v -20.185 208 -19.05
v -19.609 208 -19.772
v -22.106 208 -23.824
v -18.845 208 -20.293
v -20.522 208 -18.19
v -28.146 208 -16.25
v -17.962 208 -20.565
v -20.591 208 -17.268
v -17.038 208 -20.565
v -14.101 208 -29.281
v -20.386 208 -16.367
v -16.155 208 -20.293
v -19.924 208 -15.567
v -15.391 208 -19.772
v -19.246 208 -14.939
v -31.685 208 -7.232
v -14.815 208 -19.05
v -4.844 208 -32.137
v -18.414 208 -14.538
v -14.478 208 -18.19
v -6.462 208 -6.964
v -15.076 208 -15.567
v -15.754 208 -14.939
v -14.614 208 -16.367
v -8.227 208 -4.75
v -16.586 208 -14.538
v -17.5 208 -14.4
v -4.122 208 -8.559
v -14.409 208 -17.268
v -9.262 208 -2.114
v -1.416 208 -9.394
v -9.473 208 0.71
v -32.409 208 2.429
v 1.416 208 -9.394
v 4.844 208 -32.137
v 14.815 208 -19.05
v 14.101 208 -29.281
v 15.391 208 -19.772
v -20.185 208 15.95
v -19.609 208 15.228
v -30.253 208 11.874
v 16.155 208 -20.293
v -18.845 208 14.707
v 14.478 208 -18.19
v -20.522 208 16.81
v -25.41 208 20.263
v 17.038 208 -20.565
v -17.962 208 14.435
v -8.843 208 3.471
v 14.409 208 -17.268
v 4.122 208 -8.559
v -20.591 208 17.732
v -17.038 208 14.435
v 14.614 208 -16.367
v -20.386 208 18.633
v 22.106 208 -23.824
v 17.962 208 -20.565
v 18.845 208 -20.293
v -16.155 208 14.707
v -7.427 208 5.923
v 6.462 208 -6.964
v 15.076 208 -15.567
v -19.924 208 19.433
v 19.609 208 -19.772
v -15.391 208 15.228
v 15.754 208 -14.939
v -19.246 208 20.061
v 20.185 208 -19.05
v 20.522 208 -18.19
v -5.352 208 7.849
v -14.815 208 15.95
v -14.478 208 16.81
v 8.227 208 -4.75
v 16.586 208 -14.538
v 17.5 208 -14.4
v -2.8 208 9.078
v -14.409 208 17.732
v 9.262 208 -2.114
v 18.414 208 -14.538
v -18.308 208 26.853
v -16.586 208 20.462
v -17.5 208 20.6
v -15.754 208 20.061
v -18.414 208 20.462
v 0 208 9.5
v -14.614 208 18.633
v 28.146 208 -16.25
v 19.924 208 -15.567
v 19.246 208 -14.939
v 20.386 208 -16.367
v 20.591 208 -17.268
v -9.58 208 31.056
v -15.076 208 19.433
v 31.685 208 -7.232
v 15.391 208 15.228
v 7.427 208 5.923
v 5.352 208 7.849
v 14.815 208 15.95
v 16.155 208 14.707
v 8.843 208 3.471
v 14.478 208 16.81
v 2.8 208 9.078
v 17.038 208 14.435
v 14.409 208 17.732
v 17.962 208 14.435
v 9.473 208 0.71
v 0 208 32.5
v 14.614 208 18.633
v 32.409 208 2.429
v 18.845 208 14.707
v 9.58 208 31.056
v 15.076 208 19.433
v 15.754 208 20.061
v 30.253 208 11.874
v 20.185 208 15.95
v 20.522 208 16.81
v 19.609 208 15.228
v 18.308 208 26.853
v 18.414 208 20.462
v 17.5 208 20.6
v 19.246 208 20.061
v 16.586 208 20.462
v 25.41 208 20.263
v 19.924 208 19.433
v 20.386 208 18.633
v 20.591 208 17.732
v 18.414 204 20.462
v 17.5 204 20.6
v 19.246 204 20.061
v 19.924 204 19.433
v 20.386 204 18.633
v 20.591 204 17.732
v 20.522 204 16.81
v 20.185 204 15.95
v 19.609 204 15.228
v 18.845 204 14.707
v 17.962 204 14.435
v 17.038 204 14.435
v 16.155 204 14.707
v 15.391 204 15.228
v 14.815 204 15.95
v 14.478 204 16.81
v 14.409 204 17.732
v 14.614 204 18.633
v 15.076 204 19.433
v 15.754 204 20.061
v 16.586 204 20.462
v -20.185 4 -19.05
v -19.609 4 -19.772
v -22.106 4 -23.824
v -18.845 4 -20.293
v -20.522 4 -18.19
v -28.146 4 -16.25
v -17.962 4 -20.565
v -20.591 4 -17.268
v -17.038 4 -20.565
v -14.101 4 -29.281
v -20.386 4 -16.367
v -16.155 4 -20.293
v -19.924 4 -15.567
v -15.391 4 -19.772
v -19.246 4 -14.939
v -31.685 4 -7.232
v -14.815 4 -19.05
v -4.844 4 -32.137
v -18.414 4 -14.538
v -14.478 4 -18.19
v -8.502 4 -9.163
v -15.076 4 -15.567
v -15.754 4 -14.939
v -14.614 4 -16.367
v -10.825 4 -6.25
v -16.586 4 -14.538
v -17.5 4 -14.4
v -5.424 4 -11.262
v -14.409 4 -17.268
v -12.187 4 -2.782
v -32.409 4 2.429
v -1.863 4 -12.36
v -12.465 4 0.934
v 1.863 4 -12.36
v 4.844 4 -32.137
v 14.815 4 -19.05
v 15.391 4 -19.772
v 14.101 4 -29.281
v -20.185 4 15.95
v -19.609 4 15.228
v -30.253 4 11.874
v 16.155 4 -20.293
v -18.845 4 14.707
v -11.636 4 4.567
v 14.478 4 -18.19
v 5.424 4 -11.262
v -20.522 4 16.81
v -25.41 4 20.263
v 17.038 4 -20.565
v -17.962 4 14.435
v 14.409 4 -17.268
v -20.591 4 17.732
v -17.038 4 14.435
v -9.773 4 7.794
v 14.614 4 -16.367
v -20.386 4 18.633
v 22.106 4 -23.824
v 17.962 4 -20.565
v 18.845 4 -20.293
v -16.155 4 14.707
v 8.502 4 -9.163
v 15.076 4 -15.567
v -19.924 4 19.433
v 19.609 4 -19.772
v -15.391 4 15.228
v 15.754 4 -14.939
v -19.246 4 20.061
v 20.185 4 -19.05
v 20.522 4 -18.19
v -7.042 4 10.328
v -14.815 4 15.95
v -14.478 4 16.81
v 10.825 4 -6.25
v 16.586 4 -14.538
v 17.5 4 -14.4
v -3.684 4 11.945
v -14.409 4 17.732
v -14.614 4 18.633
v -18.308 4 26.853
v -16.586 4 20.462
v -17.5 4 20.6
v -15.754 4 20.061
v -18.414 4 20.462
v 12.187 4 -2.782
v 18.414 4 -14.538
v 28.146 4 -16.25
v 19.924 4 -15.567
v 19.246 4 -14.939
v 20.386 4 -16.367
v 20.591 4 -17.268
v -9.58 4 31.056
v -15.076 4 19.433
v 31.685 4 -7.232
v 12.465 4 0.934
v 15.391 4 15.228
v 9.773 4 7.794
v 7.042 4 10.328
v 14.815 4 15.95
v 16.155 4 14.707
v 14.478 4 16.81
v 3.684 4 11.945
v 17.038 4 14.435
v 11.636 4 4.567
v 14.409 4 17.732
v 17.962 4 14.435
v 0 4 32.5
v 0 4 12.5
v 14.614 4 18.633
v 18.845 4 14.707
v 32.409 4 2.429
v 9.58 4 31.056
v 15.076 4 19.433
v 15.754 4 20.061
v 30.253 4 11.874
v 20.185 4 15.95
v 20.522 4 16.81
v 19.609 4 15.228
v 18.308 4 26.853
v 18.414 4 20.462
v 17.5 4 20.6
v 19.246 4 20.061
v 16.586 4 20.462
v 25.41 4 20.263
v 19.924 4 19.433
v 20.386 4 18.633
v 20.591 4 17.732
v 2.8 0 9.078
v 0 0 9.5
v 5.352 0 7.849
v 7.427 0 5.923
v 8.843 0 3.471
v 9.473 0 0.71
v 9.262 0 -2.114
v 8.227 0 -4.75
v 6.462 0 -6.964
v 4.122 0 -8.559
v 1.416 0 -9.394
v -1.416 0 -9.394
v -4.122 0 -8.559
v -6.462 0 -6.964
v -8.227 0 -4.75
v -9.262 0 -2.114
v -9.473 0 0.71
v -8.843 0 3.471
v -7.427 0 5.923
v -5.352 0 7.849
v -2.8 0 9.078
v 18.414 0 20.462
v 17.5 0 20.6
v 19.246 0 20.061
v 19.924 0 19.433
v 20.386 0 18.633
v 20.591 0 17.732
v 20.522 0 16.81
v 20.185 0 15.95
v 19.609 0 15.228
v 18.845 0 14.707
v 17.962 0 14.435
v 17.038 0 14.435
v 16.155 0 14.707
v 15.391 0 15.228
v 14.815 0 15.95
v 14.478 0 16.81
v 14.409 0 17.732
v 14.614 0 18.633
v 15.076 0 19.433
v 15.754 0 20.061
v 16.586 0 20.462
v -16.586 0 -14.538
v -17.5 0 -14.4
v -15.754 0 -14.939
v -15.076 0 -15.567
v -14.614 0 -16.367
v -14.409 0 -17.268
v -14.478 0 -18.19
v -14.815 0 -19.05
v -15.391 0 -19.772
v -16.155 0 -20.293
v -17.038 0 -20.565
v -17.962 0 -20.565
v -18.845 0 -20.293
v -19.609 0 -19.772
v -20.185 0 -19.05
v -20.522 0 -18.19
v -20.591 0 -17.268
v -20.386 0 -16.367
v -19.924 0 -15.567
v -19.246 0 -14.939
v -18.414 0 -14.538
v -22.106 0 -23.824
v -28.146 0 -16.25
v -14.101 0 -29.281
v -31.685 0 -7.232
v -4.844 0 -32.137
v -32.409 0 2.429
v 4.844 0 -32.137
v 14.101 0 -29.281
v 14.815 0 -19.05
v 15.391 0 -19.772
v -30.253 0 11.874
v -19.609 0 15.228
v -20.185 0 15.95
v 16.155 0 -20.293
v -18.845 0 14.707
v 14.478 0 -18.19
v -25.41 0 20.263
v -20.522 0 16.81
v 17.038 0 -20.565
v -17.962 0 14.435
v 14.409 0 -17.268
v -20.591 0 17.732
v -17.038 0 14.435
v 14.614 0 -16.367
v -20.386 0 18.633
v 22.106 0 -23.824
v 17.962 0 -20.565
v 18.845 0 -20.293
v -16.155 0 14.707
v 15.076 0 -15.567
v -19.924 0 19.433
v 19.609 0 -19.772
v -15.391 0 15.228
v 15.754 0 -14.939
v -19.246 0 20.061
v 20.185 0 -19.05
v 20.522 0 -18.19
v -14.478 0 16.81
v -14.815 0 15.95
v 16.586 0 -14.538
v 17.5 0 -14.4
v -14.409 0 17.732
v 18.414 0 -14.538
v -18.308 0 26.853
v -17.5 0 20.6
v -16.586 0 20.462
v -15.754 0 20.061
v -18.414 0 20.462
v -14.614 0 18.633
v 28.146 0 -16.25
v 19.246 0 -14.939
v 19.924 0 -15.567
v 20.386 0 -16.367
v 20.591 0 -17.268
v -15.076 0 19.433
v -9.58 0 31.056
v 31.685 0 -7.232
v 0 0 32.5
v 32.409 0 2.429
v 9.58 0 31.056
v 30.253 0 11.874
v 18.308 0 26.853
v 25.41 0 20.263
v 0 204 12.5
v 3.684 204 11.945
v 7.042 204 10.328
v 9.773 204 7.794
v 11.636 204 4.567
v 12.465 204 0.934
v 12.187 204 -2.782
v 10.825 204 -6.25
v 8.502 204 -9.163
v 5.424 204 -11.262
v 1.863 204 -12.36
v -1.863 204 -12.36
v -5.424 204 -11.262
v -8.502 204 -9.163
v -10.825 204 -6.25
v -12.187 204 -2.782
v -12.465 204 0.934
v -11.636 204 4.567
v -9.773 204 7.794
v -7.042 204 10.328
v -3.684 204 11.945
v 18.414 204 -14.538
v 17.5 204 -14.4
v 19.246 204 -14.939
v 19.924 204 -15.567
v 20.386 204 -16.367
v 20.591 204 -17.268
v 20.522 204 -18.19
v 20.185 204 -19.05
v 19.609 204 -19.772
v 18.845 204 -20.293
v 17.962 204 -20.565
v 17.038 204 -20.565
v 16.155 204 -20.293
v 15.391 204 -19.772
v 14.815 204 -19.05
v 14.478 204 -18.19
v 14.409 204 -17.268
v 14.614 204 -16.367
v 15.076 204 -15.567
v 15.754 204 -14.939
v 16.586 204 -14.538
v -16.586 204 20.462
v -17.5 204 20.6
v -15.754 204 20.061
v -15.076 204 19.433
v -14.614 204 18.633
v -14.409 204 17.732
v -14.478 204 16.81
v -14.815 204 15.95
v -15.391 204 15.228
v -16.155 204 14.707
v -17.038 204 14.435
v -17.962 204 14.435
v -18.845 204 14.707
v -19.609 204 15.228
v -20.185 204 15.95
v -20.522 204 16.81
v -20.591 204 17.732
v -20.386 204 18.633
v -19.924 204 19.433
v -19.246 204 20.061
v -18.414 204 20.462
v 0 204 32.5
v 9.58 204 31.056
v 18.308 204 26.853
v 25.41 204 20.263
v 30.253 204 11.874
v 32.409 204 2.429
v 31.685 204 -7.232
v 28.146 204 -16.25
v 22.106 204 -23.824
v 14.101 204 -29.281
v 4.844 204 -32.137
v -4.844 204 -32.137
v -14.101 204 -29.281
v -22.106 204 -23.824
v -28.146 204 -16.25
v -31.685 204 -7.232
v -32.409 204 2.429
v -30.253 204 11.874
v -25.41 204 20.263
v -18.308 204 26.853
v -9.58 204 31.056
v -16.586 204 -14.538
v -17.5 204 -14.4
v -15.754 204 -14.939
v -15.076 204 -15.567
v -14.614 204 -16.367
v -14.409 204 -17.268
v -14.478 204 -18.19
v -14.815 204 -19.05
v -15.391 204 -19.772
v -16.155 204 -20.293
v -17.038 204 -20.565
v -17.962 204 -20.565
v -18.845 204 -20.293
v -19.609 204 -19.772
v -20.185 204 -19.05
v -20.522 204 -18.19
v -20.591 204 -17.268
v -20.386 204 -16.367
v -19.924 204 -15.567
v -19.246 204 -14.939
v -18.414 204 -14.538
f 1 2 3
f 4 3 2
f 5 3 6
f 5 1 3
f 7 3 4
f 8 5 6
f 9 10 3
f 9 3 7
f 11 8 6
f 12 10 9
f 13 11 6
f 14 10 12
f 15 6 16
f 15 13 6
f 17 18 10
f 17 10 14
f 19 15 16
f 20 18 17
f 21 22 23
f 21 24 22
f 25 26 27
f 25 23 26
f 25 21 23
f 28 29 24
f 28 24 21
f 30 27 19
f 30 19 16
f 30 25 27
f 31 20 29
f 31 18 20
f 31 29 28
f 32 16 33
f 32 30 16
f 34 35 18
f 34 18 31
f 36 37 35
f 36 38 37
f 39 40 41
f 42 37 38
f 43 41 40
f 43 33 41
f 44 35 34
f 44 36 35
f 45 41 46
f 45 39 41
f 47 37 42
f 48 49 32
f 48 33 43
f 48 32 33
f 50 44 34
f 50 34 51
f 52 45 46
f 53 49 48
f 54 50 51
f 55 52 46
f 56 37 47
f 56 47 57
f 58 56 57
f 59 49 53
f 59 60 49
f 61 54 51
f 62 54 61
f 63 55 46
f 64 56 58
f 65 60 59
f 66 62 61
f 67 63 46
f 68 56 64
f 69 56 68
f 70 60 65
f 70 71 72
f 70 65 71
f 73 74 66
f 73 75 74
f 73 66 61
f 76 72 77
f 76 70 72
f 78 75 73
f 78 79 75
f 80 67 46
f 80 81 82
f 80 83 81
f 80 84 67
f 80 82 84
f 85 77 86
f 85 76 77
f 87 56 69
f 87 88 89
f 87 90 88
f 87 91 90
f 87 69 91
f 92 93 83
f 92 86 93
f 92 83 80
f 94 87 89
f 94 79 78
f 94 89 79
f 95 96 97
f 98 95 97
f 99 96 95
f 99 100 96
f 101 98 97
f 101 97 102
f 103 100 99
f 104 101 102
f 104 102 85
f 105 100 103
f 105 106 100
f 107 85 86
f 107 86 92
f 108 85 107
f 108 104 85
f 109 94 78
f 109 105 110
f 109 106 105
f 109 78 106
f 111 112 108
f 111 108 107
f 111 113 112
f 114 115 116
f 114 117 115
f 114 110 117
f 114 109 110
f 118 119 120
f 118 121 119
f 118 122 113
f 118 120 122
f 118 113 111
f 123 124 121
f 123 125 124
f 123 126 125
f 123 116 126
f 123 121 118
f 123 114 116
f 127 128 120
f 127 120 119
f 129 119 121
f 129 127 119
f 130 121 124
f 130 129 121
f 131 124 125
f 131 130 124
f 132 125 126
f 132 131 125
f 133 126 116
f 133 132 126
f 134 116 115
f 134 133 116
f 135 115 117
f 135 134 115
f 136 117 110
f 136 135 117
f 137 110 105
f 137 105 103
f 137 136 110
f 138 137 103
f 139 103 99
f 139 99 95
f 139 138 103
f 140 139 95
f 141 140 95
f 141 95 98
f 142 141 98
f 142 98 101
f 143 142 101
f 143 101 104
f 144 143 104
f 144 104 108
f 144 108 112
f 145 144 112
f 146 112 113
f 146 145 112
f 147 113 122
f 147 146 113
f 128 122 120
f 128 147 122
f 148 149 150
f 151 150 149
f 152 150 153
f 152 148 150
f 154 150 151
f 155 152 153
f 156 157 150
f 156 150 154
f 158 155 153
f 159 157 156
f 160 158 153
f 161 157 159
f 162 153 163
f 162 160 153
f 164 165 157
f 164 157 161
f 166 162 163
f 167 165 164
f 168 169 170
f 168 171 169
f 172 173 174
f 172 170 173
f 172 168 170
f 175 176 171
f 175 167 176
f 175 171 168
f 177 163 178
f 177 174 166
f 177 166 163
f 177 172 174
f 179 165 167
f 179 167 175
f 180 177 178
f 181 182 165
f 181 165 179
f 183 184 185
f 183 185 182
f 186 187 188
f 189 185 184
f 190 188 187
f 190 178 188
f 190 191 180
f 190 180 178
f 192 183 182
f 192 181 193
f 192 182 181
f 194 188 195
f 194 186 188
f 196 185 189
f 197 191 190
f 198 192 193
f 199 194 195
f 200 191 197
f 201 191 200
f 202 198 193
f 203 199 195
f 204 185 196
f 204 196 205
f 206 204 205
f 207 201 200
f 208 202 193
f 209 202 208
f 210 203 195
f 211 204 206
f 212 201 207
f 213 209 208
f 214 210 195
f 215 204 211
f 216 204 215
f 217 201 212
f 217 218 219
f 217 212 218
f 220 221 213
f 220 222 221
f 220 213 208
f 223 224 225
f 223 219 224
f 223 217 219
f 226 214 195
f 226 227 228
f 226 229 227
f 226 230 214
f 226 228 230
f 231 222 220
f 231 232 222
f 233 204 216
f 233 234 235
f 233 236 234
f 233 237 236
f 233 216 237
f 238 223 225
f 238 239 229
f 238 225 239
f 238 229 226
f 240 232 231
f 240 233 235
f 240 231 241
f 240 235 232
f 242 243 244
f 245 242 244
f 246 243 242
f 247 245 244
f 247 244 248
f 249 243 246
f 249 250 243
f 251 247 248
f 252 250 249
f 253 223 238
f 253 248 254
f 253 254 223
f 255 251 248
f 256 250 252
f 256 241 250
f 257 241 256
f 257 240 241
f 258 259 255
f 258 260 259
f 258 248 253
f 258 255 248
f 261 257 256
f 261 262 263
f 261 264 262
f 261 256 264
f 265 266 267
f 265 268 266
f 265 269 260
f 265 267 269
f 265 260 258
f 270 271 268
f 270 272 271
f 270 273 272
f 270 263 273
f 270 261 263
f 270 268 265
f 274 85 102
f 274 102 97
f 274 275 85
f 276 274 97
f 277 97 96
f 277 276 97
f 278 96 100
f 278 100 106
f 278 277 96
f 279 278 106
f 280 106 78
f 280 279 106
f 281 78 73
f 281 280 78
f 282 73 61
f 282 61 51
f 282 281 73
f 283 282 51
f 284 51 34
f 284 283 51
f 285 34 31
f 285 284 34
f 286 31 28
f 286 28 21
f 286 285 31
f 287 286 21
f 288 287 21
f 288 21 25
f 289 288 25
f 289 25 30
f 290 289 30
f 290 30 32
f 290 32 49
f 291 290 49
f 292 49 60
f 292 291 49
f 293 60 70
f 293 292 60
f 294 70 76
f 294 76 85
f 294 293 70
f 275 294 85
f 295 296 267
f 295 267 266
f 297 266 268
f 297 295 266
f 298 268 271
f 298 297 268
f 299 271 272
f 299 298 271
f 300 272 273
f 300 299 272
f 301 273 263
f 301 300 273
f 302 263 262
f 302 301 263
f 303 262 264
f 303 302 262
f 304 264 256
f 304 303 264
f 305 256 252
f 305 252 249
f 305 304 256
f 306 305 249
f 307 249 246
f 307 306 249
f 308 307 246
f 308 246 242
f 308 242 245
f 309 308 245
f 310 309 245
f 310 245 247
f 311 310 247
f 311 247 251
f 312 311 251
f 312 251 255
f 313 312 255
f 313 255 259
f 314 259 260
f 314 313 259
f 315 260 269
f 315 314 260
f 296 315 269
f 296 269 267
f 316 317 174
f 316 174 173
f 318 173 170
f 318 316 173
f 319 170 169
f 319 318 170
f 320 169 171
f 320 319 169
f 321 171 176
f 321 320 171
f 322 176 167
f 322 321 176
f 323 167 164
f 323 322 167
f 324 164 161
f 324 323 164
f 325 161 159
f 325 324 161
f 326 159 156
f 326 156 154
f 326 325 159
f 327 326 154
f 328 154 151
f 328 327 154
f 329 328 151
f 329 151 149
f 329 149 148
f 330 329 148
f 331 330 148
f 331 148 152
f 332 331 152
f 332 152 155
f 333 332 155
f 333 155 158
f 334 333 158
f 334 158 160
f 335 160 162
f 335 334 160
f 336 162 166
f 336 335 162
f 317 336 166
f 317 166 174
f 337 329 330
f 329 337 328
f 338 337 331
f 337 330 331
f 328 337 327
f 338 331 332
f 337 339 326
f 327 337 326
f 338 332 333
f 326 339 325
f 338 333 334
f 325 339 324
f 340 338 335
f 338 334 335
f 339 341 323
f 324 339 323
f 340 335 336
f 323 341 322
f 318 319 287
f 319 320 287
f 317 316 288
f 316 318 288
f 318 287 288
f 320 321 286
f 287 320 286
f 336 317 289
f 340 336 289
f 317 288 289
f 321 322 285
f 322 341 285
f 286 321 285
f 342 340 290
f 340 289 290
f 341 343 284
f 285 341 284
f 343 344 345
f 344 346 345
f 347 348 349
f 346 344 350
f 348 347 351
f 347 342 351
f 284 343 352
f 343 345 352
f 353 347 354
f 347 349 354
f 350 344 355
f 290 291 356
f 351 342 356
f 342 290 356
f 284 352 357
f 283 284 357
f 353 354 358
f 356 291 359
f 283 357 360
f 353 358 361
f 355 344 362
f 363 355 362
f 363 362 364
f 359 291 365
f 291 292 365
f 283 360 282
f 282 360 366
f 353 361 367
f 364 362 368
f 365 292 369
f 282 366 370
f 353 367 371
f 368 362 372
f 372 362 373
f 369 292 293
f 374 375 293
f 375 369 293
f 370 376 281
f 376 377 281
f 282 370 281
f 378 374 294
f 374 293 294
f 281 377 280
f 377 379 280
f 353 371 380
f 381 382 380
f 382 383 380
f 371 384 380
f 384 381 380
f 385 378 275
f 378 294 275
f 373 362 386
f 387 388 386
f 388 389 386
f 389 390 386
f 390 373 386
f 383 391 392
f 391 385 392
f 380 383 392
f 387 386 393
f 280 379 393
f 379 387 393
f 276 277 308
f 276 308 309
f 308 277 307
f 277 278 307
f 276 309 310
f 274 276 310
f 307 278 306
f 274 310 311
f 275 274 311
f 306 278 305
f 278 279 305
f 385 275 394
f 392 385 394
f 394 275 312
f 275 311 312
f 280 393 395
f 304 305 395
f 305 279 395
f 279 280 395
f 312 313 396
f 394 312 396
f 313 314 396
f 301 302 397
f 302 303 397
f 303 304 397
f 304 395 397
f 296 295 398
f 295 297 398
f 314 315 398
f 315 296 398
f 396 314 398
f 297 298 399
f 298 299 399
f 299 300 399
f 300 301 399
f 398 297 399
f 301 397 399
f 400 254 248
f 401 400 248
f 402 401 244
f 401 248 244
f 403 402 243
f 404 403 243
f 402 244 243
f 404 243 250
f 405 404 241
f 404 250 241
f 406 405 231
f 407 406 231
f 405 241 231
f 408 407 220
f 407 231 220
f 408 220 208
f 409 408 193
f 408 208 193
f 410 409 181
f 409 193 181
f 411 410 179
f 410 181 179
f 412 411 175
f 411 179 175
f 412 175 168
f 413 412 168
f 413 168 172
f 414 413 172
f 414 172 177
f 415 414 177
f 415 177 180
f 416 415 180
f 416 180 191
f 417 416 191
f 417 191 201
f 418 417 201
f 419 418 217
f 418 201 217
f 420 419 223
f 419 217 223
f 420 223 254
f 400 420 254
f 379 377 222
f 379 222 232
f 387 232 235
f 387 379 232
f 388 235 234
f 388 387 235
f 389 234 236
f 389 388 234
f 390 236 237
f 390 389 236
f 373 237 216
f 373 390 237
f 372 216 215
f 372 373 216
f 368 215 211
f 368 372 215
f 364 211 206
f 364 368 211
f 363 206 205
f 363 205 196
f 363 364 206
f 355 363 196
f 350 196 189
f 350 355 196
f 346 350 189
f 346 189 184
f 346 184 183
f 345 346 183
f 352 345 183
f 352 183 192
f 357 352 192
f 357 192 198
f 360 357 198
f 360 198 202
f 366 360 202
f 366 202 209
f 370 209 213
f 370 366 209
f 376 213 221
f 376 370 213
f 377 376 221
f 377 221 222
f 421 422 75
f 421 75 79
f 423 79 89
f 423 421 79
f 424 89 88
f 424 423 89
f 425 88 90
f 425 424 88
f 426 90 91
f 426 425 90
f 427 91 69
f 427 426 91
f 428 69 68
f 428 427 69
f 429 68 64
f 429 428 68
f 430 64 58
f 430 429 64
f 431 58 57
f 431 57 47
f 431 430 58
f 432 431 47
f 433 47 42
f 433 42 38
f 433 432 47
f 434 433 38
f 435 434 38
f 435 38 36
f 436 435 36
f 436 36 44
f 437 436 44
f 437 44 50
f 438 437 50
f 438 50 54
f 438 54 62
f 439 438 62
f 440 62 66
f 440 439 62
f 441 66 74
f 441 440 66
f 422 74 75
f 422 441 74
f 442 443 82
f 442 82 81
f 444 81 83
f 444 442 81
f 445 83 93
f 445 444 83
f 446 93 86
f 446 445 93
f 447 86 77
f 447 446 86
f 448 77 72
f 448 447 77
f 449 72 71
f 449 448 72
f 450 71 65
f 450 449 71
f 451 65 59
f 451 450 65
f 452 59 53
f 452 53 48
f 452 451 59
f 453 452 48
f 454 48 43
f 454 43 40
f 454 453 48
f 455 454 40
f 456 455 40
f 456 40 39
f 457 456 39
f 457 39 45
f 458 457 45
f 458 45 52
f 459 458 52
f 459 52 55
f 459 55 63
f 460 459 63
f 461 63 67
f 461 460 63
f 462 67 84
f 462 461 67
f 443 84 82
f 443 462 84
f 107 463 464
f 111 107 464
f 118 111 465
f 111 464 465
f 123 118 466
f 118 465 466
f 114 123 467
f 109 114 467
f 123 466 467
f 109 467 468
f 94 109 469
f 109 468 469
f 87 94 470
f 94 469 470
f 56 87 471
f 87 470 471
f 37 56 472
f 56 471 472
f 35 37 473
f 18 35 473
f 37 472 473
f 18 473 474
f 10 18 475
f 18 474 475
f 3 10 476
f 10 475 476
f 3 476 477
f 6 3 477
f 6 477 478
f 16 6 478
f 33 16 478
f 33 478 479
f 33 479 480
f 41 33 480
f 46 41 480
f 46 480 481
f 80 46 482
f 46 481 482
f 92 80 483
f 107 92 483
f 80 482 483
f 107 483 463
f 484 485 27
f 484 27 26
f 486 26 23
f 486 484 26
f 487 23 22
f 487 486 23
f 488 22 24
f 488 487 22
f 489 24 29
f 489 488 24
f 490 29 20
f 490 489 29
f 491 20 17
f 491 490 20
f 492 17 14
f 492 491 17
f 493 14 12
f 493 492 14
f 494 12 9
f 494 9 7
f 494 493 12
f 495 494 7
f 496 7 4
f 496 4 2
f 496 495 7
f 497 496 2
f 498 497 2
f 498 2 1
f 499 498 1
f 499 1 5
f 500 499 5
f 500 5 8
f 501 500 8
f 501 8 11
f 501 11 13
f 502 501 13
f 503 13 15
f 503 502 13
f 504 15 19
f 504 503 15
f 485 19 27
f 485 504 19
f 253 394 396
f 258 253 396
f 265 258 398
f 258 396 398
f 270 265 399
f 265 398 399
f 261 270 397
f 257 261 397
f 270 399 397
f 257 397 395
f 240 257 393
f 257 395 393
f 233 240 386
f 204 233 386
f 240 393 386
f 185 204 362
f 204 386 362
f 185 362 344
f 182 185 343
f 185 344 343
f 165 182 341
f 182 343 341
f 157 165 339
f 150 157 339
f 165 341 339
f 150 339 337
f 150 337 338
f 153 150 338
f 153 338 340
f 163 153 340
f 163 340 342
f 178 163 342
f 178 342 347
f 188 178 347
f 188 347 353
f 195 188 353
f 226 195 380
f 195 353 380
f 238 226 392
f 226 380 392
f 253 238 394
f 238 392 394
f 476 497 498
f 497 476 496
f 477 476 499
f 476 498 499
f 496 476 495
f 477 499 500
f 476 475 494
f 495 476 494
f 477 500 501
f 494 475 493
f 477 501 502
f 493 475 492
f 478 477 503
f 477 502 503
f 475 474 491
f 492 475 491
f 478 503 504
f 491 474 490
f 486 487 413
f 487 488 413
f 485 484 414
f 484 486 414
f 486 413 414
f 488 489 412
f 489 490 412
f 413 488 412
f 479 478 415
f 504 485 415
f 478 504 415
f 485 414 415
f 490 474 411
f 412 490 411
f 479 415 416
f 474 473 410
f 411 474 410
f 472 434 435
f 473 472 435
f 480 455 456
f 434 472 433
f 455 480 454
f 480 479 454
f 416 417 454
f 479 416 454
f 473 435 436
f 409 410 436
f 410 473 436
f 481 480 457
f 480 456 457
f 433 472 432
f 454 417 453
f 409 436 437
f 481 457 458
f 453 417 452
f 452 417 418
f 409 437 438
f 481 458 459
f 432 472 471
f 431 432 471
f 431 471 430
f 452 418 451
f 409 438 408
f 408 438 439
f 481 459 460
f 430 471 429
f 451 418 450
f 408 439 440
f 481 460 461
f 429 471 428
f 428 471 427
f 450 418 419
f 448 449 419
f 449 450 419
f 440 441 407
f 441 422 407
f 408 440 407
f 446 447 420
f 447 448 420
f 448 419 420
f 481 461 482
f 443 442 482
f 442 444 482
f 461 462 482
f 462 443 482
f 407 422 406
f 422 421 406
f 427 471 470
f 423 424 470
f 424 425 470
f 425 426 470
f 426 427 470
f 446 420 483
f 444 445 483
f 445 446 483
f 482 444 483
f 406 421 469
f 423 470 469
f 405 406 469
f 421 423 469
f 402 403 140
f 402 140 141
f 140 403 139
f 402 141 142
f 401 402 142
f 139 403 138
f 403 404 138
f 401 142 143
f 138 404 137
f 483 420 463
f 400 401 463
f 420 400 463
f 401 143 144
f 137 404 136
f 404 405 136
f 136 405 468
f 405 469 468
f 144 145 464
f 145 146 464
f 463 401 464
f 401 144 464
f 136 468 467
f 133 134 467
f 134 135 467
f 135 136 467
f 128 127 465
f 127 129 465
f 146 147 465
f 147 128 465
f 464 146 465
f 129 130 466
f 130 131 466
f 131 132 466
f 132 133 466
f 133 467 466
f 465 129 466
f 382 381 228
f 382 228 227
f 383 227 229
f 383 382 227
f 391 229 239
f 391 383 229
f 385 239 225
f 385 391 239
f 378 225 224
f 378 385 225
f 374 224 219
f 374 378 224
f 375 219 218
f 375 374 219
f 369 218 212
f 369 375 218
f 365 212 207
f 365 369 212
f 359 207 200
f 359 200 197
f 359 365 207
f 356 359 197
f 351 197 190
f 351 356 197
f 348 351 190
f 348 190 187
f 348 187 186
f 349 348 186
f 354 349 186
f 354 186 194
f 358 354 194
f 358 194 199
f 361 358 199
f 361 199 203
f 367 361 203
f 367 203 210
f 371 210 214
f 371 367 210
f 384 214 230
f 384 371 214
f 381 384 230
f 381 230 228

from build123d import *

# Parameters (mm, degrees)
SKETCH1_R           = 32.5
SKETCH1_R_2         = 9.5
SKETCH1_R_3         = 3.1
BOSS_EXTRUDE1_DEPTH = 4
SKETCH2_R           = 12.5
SKETCH2_R_2         = 9.5
BOSS_EXTRUDE2_DEPTH = 200
SKETCH3_R           = 32.5
SKETCH3_R_2         = 3.1
SKETCH3_R_3         = 9.5
BOSS_EXTRUDE3_DEPTH = 4


with BuildPart() as part:
    # Sketch1 → Boss-Extrude1 (new body)
    with BuildSketch(Plane(origin=(0, 0, 0), x_dir=(1, 0, 0), z_dir=(0, 1, 0))):
        with Locations(Location((0, 0, 0), (0, 0, 270))):
            Circle(SKETCH1_R)
        with Locations(Location((0, 0, 0), (0, 0, 270))):
            Circle(SKETCH1_R_2, mode=Mode.SUBTRACT)
        with Locations(Location((-17.5, 17.5, 0), (0, 0, 270))):
            Circle(SKETCH1_R_3, mode=Mode.SUBTRACT)
        with Locations(Location((17.5, 17.5, 0), (0, 0, 270))):
            Circle(SKETCH1_R_3, mode=Mode.SUBTRACT)
        with Locations(Location((17.5, -17.5, 0), (0, 0, 270))):
            Circle(SKETCH1_R_3, mode=Mode.SUBTRACT)
        with Locations(Location((-17.5, -17.5, 0), (0, 0, 270))):
            Circle(SKETCH1_R_3, mode=Mode.SUBTRACT)
    extrude(amount=BOSS_EXTRUDE1_DEPTH)

    # Sketch2 → Boss-Extrude2 (add)
    with BuildSketch(Plane(origin=(0, 4, 0), x_dir=(1, 0, 0), z_dir=(0, 1, 0))):
        with Locations(Location((0, 0, 0), (0, 0, 270))):
            Circle(SKETCH2_R)
        with Locations(Location((0, 0, 0), (0, 0, 270))):
            Circle(SKETCH2_R_2, mode=Mode.SUBTRACT)
    extrude(amount=BOSS_EXTRUDE2_DEPTH)

    # Sketch3 → Boss-Extrude3 (add)
    with BuildSketch(Plane(origin=(0, 204, 0), x_dir=(1, 0, 0), z_dir=(0, 1, 0))):
        with Locations(Location((0, 0, 0), (0, 0, 270))):
            Circle(SKETCH3_R)
        with Locations(Location((-17.5, 17.5, 0), (0, 0, 270))):
            Circle(SKETCH3_R_2, mode=Mode.SUBTRACT)
        with Locations(Location((17.5, 17.5, 0), (0, 0, 270))):
            Circle(SKETCH3_R_2, mode=Mode.SUBTRACT)
        with Locations(Location((17.5, -17.5, 0), (0, 0, 270))):
            Circle(SKETCH3_R_2, mode=Mode.SUBTRACT)
        with Locations(Location((-17.5, -17.5, 0), (0, 0, 270))):
            Circle(SKETCH3_R_2, mode=Mode.SUBTRACT)
        with Locations(Location((0, 0, 0), (0, 0, 270))):
            Circle(SKETCH3_R_3, mode=Mode.SUBTRACT)
    extrude(amount=BOSS_EXTRUDE3_DEPTH)


solid = part.part
